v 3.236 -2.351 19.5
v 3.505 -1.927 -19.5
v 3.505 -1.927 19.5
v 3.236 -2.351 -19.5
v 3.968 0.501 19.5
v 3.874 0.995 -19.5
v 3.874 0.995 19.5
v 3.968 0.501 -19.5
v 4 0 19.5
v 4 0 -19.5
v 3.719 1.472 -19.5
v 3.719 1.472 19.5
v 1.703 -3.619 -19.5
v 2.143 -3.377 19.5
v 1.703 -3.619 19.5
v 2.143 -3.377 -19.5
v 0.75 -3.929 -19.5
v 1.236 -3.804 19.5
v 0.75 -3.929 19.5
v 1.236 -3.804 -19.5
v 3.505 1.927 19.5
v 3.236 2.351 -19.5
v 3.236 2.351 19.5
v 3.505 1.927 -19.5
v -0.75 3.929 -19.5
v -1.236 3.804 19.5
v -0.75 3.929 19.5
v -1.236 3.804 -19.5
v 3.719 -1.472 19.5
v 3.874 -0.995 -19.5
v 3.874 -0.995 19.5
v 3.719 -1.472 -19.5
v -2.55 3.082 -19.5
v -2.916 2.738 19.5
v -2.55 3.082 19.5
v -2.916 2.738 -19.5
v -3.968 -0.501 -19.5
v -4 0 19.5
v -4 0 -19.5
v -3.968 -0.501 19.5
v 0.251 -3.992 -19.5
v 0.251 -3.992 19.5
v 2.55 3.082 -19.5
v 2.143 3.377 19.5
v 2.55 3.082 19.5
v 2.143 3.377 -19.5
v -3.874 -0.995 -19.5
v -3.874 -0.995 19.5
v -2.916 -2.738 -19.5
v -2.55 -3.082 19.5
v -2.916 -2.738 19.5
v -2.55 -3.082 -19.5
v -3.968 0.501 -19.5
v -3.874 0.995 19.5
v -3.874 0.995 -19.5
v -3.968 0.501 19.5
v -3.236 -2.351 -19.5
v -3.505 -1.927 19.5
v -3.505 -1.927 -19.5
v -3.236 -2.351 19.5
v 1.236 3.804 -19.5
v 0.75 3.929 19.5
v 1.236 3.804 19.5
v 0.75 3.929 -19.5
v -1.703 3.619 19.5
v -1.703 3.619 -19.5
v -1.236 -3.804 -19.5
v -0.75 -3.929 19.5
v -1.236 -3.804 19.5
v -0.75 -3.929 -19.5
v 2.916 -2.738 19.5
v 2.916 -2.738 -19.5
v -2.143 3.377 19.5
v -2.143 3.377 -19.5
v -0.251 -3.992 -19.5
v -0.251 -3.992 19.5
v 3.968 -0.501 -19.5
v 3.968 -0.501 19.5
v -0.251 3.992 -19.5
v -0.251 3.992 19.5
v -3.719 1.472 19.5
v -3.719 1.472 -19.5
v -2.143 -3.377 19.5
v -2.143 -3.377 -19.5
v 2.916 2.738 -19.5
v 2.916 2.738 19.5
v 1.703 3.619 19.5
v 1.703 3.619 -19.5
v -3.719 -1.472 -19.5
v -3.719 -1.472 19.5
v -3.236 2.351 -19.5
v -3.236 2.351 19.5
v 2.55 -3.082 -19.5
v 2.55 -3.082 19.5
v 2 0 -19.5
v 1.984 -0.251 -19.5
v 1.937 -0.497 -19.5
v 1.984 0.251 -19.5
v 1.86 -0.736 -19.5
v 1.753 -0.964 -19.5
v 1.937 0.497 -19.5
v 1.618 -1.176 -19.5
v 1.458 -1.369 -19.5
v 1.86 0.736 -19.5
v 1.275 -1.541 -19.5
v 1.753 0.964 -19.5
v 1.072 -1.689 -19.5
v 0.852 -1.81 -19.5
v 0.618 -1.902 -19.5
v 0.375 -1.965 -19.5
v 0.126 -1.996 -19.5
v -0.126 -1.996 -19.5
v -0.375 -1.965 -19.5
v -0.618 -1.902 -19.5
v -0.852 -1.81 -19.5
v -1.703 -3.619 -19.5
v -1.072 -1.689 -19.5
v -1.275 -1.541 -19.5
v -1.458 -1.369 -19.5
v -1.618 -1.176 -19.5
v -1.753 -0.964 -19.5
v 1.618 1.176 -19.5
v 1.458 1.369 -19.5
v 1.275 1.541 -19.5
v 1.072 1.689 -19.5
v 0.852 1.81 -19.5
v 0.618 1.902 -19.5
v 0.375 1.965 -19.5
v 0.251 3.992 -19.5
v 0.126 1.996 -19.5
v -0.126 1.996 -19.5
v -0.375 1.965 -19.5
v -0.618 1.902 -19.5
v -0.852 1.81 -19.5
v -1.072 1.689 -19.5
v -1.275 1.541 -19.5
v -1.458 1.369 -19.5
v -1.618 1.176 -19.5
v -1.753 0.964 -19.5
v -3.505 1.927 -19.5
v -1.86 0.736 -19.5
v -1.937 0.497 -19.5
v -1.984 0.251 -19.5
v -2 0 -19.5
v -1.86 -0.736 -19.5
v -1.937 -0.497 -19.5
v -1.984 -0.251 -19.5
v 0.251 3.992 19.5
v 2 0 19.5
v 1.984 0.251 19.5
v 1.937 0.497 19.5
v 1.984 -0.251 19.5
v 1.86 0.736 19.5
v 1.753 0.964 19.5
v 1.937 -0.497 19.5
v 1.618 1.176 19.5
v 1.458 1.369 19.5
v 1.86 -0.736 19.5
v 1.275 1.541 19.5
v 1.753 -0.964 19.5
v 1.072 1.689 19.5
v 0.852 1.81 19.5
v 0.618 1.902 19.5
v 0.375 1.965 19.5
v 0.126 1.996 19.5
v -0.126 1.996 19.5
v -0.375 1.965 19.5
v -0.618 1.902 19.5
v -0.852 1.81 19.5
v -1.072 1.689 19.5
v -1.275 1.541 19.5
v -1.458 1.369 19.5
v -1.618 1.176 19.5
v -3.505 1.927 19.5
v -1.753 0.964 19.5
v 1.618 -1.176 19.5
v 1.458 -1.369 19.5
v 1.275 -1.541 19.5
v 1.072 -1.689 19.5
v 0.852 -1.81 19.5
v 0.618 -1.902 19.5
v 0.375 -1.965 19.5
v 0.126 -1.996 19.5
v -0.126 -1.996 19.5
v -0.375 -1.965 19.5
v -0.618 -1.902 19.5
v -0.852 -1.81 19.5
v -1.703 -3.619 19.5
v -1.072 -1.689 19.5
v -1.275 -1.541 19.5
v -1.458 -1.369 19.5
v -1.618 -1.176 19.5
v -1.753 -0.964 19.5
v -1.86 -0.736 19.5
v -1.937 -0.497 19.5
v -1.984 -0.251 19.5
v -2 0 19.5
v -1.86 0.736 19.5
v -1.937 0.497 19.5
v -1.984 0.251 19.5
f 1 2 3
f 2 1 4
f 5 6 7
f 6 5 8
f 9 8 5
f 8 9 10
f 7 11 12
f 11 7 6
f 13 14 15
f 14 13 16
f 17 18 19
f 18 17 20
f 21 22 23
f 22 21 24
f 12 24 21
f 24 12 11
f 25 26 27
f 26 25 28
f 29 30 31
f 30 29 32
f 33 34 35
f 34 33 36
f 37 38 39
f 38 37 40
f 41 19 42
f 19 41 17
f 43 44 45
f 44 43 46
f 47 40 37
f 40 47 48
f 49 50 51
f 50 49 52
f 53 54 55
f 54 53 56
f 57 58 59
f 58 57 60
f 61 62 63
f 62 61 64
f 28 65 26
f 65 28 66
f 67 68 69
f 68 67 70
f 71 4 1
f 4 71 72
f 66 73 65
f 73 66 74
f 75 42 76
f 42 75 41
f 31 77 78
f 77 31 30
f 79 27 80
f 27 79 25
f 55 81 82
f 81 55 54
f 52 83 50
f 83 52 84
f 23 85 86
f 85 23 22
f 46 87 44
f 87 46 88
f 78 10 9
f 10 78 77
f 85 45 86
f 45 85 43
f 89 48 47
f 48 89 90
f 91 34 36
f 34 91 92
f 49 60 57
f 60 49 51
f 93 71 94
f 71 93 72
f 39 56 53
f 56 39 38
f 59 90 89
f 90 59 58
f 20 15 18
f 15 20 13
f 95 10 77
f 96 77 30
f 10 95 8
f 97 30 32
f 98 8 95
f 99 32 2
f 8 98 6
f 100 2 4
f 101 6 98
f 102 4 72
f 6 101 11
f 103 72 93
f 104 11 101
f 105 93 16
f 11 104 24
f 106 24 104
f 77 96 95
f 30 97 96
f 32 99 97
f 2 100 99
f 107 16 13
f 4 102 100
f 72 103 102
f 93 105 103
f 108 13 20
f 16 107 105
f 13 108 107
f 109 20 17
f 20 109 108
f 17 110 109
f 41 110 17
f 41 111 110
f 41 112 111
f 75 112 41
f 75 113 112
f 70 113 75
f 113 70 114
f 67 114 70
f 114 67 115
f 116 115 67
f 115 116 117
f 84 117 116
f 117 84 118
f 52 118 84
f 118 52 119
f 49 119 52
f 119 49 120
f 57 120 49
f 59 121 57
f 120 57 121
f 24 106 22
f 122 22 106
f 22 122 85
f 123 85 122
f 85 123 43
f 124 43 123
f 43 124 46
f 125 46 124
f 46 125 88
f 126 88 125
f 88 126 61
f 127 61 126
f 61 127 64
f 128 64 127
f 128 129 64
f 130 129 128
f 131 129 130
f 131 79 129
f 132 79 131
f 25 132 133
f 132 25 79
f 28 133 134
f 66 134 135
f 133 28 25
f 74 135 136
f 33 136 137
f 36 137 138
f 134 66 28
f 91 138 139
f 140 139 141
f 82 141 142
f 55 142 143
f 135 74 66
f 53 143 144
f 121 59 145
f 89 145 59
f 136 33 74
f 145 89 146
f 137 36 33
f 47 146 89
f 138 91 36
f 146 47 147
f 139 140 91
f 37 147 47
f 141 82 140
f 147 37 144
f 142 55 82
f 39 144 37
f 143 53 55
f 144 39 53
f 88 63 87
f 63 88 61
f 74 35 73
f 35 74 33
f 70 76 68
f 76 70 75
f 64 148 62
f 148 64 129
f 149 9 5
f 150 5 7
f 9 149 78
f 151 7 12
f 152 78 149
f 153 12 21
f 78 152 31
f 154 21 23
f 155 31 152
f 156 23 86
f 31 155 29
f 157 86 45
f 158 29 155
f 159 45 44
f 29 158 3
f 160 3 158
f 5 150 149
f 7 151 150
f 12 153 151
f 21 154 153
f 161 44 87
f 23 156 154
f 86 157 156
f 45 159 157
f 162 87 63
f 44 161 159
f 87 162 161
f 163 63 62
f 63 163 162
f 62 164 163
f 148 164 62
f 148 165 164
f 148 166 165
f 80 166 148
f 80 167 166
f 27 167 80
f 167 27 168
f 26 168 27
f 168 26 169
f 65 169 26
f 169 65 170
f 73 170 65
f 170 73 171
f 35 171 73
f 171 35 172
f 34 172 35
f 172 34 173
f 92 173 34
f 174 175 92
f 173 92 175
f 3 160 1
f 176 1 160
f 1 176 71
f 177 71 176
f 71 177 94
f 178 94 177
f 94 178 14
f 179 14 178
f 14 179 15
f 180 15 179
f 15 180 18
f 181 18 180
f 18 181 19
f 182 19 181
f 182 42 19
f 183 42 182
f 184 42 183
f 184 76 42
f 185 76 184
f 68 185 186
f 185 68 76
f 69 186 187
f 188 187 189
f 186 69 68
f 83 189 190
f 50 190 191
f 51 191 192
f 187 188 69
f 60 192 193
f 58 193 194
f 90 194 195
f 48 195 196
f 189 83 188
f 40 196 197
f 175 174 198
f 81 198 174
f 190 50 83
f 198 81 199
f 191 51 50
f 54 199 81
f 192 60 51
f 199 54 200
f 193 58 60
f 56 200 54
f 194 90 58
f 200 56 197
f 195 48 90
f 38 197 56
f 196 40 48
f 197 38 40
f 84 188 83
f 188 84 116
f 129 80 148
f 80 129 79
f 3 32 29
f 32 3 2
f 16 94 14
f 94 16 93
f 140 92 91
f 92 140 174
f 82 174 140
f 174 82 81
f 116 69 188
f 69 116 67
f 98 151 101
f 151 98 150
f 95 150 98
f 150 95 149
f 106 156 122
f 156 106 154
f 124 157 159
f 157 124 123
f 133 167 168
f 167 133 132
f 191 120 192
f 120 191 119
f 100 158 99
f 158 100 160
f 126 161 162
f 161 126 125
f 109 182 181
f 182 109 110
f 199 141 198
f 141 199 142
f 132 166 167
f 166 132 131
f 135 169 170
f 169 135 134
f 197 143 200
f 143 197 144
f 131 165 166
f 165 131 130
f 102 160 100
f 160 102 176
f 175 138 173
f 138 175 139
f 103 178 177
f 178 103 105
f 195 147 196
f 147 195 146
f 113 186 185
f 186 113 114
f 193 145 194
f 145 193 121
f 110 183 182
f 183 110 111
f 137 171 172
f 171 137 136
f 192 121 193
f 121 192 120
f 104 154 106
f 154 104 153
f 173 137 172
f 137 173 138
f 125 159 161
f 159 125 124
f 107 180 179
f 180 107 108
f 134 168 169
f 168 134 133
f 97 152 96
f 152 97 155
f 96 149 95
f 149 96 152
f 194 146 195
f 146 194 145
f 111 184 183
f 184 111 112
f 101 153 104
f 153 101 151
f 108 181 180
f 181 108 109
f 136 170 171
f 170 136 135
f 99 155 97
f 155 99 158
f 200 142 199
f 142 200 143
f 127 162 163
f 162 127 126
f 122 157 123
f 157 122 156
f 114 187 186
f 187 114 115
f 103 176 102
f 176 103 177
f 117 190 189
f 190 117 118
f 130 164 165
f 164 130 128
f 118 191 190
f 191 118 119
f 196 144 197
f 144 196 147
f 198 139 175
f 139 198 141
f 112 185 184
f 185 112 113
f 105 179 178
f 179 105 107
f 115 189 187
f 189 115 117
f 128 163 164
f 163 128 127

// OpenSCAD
$fn = 50;


difference() {
	union() {
		translate(v = [0, 0, -19.5000000000]) {
			cylinder(h = 39, r = 4.0000000000);
		}
	}
	union() {
		translate(v = [0, 0, -100.0000000000]) {
			cylinder(h = 200, r = 2.0000000000);
		}
	}
}
